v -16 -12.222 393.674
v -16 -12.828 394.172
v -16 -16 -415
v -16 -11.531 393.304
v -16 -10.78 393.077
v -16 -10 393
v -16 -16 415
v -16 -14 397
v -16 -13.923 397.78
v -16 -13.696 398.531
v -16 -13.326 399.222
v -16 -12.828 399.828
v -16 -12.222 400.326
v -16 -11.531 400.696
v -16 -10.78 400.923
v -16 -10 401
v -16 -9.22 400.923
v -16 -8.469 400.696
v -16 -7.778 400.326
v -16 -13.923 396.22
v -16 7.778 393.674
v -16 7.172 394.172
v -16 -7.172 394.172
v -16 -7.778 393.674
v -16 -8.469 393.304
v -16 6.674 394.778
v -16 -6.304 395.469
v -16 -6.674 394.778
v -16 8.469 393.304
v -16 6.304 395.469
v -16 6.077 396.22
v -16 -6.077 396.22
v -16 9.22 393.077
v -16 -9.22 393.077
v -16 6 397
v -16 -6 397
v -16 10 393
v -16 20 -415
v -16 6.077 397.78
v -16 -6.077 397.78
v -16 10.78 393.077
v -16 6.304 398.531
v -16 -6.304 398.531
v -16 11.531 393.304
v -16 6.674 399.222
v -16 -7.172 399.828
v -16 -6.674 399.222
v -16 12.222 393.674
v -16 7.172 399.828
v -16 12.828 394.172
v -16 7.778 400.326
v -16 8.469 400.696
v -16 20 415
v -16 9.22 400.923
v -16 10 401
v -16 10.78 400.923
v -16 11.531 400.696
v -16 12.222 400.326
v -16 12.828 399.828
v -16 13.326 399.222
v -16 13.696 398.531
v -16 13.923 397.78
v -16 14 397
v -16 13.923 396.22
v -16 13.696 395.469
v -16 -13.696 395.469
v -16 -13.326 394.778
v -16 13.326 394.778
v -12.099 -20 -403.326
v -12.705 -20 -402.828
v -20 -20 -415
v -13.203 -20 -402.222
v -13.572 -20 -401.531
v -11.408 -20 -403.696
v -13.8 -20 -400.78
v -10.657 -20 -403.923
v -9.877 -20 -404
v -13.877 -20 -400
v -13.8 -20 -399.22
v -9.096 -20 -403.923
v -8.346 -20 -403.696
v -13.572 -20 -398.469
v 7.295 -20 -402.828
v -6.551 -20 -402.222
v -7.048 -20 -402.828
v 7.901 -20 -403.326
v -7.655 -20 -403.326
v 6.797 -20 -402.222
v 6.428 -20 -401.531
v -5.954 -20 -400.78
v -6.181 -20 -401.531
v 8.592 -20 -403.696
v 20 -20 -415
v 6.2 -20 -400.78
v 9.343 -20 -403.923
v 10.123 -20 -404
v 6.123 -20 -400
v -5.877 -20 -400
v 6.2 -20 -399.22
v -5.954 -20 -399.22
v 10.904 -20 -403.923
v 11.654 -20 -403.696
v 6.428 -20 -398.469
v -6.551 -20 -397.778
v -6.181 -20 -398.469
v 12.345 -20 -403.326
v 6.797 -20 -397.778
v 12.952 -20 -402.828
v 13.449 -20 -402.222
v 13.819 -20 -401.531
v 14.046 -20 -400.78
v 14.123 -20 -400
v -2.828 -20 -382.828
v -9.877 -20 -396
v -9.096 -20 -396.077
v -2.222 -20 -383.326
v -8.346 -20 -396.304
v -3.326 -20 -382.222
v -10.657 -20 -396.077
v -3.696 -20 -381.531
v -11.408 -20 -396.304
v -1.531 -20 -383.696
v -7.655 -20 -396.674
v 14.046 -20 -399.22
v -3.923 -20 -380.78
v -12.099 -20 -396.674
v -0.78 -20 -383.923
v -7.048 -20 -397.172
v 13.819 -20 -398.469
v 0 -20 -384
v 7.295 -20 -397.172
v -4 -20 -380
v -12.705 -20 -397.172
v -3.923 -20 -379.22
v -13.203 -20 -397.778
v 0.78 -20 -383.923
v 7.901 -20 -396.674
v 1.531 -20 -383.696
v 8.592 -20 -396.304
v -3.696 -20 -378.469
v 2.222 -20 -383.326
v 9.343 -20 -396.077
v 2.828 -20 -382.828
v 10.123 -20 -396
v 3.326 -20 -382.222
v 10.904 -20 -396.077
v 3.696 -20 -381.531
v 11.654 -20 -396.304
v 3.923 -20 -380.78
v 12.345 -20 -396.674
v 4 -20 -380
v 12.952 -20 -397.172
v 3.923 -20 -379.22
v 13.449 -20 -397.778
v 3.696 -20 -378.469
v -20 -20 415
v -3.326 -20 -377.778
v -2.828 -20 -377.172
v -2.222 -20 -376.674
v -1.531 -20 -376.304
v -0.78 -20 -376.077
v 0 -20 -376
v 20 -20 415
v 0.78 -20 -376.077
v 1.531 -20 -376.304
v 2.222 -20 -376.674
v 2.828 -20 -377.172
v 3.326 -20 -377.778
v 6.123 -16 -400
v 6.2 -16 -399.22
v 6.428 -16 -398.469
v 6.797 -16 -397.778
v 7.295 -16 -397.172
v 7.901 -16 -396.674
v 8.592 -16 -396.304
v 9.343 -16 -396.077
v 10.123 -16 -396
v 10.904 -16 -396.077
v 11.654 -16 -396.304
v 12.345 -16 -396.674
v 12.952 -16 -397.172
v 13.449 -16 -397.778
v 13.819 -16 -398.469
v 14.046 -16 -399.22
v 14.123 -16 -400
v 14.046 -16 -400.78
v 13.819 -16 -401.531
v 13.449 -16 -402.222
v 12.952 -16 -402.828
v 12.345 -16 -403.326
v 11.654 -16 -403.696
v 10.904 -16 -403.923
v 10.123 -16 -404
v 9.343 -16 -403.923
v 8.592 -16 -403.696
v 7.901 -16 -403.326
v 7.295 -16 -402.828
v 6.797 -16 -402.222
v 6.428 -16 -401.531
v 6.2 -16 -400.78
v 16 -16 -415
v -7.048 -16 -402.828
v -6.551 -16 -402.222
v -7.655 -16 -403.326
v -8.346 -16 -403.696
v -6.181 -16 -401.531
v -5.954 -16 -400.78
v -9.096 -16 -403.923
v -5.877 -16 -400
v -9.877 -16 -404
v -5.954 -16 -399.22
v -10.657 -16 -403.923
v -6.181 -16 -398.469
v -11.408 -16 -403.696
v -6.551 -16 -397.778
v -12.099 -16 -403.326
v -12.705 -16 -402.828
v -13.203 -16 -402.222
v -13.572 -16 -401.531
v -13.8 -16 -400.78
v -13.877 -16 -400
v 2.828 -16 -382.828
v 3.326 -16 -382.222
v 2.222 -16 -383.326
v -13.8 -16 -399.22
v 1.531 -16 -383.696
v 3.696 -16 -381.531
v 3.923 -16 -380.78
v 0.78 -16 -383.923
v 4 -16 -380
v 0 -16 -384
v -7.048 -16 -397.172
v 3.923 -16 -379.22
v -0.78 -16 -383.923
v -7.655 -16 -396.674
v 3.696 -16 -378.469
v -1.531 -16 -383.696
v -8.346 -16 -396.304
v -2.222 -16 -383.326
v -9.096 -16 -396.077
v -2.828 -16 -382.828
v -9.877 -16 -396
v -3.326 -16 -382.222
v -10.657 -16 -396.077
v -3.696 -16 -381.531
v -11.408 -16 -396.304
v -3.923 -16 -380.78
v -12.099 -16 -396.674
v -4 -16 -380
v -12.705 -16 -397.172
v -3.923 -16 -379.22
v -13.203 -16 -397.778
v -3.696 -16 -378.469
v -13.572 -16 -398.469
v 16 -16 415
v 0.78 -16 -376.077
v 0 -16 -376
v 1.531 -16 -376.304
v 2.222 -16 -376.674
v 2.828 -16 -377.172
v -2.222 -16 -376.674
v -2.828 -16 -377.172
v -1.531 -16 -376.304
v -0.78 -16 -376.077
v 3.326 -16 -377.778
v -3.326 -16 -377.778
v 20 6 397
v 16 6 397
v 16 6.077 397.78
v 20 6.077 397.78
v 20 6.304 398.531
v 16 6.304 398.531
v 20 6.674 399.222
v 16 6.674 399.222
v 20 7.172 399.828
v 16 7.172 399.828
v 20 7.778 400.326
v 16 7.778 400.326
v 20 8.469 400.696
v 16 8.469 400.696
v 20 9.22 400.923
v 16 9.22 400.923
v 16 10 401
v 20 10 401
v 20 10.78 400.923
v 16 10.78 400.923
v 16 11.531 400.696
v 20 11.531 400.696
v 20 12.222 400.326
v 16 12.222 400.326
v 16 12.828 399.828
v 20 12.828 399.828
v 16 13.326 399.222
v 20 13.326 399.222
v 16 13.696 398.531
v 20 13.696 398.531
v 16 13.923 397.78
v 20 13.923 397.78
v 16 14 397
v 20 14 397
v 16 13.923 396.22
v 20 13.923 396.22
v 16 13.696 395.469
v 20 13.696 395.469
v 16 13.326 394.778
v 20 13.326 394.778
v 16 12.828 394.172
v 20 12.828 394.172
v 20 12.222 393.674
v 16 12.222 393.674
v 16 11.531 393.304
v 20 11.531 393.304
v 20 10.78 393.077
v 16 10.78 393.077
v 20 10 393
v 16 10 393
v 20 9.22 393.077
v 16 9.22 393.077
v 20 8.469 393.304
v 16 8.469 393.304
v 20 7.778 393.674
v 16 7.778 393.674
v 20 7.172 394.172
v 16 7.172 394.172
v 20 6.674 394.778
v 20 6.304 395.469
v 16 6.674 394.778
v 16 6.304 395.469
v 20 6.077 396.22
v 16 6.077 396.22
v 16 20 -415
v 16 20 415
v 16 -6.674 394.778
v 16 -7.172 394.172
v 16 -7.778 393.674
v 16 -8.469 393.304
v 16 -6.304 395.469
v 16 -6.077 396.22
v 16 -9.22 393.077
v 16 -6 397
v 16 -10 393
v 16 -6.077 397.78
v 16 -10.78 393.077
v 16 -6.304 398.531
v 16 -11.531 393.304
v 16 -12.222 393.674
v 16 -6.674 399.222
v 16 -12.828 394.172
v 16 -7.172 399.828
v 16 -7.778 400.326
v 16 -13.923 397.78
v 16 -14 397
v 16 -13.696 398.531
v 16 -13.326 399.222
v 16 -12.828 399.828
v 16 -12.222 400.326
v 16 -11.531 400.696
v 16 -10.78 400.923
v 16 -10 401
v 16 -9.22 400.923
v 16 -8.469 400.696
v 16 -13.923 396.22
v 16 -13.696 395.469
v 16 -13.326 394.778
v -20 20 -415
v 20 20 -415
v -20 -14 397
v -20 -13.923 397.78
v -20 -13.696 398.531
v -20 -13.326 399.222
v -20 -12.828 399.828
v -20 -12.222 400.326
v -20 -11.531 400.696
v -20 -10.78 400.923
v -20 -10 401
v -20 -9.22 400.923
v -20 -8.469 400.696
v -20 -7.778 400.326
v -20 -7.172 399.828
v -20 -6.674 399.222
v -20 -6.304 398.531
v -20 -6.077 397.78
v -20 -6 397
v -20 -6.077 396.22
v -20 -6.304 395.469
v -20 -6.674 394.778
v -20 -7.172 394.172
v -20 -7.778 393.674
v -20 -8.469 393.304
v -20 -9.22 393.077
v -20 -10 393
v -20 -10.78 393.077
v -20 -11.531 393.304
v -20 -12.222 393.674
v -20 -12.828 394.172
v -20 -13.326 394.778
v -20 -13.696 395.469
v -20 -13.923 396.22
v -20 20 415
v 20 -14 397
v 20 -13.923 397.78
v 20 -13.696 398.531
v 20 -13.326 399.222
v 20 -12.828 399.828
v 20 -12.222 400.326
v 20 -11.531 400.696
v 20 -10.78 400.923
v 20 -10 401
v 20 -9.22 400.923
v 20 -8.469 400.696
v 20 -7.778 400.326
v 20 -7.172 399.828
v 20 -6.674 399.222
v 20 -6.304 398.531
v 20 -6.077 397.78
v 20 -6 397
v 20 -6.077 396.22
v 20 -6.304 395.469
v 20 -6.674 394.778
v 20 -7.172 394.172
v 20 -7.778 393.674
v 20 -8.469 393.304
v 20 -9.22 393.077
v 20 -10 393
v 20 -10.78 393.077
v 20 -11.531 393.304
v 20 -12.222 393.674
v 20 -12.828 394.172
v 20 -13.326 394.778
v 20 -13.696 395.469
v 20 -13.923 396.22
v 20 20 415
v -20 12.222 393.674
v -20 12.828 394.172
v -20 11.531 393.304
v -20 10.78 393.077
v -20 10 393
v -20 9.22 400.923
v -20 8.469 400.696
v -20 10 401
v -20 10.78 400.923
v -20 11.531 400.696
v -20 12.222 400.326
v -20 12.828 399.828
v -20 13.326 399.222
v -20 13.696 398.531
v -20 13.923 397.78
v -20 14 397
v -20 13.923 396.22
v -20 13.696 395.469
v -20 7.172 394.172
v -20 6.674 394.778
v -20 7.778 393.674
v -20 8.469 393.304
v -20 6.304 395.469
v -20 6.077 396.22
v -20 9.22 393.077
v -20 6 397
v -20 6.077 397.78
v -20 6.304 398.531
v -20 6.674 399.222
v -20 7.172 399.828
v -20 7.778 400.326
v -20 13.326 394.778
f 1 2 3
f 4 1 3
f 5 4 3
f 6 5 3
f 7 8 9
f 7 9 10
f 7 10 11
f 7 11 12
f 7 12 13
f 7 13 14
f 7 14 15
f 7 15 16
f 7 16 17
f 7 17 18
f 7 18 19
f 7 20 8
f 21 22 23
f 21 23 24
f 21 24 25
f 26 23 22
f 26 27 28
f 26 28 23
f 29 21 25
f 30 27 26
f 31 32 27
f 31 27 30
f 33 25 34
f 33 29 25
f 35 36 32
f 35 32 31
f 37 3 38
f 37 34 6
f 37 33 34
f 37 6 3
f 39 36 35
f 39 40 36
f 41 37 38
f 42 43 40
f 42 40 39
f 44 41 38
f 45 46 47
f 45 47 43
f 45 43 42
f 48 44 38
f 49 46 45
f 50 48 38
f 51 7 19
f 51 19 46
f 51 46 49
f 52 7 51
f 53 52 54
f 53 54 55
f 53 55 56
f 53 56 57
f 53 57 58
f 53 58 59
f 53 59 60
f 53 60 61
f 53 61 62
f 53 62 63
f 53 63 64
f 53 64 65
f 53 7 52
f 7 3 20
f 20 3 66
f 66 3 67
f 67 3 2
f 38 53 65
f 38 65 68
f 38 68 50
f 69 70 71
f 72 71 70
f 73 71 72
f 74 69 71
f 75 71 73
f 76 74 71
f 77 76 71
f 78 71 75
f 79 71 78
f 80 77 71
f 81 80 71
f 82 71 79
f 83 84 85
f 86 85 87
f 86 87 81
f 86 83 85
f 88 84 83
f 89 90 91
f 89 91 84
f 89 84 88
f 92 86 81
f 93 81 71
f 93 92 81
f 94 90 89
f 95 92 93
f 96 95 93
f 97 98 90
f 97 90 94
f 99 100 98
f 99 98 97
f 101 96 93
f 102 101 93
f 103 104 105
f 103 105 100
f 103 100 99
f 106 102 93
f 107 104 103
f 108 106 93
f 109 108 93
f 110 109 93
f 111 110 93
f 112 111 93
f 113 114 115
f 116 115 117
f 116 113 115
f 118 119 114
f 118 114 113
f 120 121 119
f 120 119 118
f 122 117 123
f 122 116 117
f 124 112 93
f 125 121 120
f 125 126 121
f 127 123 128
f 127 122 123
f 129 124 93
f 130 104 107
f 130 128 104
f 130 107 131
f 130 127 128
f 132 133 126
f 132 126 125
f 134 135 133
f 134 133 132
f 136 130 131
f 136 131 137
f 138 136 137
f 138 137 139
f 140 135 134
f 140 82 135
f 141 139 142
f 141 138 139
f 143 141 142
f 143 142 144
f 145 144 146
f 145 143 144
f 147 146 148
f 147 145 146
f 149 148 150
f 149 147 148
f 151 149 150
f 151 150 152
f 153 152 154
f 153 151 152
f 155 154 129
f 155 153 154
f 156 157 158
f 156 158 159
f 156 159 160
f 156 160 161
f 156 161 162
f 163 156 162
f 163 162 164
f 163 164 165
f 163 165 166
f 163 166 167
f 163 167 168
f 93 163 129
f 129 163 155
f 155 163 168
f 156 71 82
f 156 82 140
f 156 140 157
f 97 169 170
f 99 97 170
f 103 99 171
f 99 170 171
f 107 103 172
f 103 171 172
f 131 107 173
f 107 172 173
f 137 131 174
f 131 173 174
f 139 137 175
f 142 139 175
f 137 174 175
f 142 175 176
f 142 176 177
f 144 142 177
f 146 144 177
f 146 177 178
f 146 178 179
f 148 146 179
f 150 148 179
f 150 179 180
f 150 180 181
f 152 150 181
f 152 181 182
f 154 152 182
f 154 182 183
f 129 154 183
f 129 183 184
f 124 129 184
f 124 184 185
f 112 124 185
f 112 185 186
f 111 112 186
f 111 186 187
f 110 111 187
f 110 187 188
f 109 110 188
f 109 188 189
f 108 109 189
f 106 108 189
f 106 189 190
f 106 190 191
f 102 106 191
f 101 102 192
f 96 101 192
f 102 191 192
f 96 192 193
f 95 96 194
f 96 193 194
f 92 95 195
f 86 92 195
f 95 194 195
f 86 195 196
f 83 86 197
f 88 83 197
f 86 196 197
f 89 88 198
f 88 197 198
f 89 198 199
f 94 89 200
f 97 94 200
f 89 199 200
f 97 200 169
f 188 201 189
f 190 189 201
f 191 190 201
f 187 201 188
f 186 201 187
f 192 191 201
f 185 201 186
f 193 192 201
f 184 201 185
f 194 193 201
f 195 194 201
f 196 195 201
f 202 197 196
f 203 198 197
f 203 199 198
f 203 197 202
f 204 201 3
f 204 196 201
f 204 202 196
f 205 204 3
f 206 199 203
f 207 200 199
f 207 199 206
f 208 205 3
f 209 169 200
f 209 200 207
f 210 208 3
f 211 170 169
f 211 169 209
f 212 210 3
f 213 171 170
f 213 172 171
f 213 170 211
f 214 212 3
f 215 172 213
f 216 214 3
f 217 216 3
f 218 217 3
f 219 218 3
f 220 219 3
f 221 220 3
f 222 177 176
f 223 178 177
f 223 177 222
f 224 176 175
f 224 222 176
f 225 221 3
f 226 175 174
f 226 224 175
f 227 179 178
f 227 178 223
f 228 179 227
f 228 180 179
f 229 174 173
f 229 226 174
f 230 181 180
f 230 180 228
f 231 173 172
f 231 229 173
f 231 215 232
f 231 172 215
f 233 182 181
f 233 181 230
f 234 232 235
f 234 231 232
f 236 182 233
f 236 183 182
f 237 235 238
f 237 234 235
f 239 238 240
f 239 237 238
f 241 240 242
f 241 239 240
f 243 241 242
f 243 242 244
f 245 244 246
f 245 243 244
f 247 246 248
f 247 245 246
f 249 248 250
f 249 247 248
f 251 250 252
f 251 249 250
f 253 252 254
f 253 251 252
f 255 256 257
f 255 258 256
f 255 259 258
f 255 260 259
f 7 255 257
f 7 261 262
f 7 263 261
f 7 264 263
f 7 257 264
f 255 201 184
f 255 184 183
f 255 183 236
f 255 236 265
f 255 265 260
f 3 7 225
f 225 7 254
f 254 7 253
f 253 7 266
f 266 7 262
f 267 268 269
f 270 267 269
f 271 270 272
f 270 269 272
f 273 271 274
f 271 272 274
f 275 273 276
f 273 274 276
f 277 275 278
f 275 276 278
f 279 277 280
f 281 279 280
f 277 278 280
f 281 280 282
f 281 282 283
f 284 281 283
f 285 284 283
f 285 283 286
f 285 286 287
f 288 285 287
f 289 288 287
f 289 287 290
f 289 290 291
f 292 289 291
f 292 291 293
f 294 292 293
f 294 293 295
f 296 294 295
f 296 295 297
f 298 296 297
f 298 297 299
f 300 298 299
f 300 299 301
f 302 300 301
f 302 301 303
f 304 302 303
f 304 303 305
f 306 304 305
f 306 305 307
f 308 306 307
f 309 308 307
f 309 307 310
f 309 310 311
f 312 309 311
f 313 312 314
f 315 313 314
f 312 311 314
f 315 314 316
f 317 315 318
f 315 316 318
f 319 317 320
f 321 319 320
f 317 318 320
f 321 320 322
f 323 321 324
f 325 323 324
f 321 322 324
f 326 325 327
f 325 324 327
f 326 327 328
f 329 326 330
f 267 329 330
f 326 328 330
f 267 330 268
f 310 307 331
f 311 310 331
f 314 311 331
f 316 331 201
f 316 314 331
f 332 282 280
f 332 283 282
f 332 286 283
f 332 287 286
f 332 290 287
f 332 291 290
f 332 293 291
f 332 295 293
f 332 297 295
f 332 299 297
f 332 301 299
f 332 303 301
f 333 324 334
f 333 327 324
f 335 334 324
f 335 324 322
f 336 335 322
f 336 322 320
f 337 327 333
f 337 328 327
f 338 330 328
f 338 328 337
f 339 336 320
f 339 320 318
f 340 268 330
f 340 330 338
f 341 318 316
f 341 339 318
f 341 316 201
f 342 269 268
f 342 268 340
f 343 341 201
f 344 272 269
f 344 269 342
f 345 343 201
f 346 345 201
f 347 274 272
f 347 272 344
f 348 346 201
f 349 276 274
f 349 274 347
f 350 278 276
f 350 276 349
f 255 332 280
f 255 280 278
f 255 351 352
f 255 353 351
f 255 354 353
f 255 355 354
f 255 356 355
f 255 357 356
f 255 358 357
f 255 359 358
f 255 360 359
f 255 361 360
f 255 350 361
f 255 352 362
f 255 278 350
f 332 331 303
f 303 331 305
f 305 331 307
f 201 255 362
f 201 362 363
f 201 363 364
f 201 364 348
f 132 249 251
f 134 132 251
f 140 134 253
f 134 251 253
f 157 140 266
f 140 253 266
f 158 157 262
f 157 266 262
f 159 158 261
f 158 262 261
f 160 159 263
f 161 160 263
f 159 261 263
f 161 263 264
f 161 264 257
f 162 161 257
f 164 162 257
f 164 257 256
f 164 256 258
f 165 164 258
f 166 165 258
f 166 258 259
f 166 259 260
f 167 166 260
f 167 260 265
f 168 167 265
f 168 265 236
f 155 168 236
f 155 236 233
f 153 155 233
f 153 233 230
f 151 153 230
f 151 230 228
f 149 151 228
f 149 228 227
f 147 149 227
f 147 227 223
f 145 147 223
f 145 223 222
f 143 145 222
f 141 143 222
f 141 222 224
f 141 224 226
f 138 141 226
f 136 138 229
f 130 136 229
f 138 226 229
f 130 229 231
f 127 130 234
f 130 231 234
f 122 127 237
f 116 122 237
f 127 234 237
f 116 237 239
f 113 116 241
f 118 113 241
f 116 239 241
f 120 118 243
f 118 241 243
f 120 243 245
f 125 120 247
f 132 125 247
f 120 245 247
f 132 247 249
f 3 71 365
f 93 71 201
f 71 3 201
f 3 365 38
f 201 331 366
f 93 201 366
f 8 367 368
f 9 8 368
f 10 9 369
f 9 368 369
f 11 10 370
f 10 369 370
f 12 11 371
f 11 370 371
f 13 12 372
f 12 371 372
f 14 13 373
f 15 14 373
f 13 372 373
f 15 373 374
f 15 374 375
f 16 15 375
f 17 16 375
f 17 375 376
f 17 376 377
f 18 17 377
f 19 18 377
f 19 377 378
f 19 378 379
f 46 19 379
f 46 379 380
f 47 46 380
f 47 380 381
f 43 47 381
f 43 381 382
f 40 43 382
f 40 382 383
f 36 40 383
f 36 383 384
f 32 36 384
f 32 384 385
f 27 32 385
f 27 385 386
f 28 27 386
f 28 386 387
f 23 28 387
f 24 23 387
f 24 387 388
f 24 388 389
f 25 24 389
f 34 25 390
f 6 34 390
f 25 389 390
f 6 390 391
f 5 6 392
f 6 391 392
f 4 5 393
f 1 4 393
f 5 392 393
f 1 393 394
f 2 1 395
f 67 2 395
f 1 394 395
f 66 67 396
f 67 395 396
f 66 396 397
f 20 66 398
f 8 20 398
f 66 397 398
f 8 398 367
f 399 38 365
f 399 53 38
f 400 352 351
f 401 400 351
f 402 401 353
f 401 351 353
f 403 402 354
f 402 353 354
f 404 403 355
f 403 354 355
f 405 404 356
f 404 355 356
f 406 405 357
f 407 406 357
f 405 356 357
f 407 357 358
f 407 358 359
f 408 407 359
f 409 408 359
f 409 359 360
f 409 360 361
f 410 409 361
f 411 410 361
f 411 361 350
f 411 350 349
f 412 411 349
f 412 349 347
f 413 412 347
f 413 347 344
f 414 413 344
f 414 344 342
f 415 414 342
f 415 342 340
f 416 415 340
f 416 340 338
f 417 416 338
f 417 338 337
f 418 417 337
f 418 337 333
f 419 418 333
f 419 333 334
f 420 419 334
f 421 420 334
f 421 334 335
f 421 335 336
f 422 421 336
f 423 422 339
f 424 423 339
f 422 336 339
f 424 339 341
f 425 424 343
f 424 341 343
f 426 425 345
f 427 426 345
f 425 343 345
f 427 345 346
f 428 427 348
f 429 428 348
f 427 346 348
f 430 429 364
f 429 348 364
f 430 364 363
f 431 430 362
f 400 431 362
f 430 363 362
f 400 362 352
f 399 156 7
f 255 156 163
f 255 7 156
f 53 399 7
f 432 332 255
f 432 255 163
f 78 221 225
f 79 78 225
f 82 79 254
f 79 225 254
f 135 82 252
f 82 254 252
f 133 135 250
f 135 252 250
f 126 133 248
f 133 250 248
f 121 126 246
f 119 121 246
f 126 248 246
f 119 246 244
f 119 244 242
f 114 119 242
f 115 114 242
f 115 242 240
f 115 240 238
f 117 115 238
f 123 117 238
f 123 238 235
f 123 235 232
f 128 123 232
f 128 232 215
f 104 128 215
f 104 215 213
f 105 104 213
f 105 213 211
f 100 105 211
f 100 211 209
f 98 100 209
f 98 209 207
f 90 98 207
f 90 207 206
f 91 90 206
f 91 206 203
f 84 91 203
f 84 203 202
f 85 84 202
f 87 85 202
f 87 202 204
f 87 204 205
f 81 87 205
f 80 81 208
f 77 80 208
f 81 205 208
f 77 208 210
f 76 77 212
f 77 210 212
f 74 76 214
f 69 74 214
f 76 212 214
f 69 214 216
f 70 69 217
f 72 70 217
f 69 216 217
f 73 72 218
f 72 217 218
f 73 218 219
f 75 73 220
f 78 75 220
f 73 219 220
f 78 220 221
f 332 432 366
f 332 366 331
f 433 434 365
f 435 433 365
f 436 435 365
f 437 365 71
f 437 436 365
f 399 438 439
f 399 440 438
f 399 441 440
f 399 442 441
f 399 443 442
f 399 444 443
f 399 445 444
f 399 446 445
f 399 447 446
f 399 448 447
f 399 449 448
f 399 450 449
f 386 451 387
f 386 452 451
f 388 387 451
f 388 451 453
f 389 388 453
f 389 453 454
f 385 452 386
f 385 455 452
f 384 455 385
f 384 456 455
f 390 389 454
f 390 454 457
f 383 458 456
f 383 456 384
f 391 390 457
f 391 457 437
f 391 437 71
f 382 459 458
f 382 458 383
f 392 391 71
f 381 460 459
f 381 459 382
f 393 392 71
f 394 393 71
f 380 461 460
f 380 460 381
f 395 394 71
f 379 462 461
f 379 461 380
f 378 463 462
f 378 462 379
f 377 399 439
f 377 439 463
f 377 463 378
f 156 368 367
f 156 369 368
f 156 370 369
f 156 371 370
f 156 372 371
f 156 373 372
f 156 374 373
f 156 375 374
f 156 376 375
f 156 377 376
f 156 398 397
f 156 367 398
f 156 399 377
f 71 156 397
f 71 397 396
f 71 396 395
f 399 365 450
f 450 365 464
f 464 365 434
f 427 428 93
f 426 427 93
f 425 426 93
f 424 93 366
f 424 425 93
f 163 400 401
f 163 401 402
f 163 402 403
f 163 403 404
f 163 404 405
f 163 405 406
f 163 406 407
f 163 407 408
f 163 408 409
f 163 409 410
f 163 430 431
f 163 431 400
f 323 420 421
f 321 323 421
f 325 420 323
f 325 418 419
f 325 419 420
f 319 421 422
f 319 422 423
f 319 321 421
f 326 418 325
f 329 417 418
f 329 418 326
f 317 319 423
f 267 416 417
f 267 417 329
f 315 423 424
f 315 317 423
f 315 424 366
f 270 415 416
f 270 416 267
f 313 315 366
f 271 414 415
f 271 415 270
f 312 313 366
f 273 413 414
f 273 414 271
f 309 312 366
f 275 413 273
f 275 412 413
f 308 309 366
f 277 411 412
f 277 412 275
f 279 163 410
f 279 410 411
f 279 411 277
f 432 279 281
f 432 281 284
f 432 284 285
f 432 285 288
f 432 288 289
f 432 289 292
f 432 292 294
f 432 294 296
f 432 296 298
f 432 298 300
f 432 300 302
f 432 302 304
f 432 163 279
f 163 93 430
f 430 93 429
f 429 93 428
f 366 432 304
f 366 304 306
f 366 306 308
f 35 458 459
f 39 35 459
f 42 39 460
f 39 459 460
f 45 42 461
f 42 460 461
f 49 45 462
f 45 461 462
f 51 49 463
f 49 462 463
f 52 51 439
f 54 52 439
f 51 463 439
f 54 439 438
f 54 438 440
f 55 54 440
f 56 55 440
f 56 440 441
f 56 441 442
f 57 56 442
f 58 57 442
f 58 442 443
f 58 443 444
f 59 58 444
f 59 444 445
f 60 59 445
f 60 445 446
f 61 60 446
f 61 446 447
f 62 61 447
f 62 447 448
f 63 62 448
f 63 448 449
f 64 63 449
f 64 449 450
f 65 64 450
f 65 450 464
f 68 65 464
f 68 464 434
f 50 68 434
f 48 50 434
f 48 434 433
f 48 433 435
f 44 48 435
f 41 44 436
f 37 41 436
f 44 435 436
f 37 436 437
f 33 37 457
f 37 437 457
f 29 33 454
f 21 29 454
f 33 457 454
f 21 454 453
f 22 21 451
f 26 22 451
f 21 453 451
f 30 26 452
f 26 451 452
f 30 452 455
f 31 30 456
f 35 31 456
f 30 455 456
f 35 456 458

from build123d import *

# Parameters (mm, degrees)
F1_DEPTH = 415
F3_D     = 8
F5_D     = 8


with BuildPart() as f1:
    # F0 (on Top) → F1 (new body, symmetric)
    with BuildSketch(Plane.XY):
        Polygon((-20, -20), (20, -20), (20, 20), (16, 20), (16, -16), (-16, -16), (-16, 20), (-20, 20), align=None)
    extrude(amount=F1_DEPTH, both=True)

    # F3 (through all)
    with Locations(Plane.YZ.offset(20)):
        with Locations((-10, 397), (10, 397)):
            Hole(F3_D / 2)

    # F5 (through all)
    with Locations(Plane.XZ.offset(20)):
        with Locations((0, -380), (10.1231555268, -400), (-9.8768444732, -400)):
            Hole(F5_D / 2)


solid = f1.part
